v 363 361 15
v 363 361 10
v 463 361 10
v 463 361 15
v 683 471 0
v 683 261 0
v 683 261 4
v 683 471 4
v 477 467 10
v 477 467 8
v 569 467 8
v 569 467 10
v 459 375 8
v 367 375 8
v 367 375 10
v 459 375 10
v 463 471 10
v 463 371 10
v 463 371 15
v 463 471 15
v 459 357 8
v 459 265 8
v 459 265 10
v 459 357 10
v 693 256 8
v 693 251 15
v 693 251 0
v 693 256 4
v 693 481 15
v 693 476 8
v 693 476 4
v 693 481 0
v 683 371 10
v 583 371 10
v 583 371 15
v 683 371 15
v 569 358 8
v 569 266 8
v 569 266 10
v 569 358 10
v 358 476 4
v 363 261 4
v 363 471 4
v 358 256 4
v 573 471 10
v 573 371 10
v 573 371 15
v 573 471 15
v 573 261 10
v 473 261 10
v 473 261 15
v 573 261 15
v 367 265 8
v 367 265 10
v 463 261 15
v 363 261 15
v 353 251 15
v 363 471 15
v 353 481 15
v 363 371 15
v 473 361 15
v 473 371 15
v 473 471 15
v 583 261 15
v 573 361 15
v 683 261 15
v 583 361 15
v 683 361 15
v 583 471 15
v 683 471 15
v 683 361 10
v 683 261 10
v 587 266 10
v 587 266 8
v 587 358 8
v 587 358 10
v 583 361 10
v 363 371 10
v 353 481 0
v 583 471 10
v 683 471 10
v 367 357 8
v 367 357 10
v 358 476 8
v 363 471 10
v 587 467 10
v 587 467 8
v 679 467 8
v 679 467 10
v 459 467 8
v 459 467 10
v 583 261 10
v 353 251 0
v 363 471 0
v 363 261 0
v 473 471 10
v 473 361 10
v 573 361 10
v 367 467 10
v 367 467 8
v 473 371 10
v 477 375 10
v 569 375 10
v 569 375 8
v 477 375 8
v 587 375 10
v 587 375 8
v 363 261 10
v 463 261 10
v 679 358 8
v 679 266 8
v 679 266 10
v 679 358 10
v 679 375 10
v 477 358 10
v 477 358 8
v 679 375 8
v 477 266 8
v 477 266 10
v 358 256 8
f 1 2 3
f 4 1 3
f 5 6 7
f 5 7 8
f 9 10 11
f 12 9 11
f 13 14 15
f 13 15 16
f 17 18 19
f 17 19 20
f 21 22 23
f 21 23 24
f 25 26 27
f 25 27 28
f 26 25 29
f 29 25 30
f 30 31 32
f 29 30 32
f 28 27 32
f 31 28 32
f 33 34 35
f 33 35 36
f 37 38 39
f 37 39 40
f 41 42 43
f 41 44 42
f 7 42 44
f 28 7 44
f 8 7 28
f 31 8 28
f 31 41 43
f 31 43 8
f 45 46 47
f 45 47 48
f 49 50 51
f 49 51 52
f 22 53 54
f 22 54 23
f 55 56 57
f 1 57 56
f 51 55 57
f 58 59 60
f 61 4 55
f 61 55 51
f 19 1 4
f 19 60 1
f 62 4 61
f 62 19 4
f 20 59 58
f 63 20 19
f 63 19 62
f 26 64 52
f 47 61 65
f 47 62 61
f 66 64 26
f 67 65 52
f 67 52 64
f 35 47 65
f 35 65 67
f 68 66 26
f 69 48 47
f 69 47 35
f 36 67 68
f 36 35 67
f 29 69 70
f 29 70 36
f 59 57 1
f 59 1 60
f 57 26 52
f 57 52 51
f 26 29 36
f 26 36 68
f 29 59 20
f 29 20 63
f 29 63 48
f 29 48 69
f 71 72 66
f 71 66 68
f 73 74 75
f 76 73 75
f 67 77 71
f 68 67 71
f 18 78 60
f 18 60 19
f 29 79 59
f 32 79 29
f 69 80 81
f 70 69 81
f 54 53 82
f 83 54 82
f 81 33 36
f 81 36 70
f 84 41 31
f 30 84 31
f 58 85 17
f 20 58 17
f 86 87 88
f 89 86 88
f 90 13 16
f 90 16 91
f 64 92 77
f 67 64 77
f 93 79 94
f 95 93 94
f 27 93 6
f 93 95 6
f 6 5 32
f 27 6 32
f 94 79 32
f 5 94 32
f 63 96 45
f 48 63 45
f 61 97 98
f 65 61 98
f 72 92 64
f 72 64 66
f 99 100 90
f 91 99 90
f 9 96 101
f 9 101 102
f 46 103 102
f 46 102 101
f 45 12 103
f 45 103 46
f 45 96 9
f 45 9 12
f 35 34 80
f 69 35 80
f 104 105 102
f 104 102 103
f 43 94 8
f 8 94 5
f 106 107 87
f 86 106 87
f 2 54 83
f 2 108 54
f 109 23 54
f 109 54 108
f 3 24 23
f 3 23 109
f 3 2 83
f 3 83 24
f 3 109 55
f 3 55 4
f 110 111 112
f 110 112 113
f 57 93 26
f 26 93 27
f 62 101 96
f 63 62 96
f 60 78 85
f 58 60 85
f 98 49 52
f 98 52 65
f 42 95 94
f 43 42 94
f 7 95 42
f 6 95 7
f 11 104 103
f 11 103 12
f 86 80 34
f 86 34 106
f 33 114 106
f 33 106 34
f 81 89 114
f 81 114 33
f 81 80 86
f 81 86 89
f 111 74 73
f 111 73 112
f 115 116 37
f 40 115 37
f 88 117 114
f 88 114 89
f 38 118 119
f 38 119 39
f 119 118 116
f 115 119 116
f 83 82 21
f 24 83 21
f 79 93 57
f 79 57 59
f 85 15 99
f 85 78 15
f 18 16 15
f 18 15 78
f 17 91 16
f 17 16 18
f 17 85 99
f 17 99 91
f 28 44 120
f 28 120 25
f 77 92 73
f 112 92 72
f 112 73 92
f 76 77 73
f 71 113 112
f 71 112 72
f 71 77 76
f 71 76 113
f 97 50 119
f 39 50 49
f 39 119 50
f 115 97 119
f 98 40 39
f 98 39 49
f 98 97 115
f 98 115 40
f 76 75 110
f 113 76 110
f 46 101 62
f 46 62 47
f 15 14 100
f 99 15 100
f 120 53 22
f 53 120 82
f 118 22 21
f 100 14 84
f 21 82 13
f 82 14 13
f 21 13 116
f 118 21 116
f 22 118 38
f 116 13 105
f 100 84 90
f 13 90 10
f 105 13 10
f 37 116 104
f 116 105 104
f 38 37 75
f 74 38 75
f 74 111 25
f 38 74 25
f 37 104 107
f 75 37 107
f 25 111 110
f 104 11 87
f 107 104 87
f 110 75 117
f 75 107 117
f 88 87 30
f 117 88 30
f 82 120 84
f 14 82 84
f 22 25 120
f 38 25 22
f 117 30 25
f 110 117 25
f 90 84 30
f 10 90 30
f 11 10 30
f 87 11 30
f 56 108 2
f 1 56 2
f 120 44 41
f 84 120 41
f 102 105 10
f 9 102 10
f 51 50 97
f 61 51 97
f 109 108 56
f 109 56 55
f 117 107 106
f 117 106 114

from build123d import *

# Parameters (mm, degrees)
BOX038_W     = 92
BOX038_H     = 92
BOX038_DEPTH = 24
BOX034_W     = 92
BOX034_H     = 92
BOX034_DEPTH = 24
BOX036_W     = 92
BOX036_H     = 92
BOX036_DEPTH = 24
BOX037_W     = 92
BOX037_H     = 92
BOX037_DEPTH = 24
BOX035_W     = 92
BOX035_H     = 92
BOX035_DEPTH = 24
BOX032_W     = 92
BOX032_H     = 92
BOX032_DEPTH = 24
BOX030_W     = 320
BOX030_H     = 210
BOX030_DEPTH = 2
BOX039_W     = 335
BOX039_H     = 220
BOX039_DEPTH = 4
BOX031_W     = 10
BOX031_H     = 210
BOX031_DEPTH = 7
BOX028_W     = 340
BOX028_H     = 10
BOX028_DEPTH = 7
BOX027_W     = 10
BOX027_H     = 210
BOX027_DEPTH = 15
BOX033_W     = 10
BOX033_H     = 210
BOX033_DEPTH = 15
BOX026_W     = 340
BOX026_H     = 10
BOX026_DEPTH = 15
BOX025_W     = 340
BOX025_H     = 10
BOX025_DEPTH = 15
BOX029_W     = 10
BOX029_H     = 210
BOX029_DEPTH = 7


with BuildPart() as cajita022:
    # Box038 → Box038 (new body)
    with BuildSketch(Plane(origin=(14, 124, 0), x_dir=(1, 0, 0), z_dir=(0, 0, 1))):
        with Locations((46, 46)):
            Rectangle(BOX038_W, BOX038_H)
    extrude(amount=BOX038_DEPTH)


with BuildPart() as cajita018:
    # Box034 → Box034 (new body)
    with BuildSketch(Plane(origin=(124, 124, 0), x_dir=(1, 0, 0), z_dir=(0, 0, 1))):
        with Locations((46, 46)):
            Rectangle(BOX034_W, BOX034_H)
    extrude(amount=BOX034_DEPTH)


with BuildPart() as cajita020:
    # Box036 → Box036 (new body)
    with BuildSketch(Plane(origin=(234, 124, 0), x_dir=(1, 0, 0), z_dir=(0, 0, 1))):
        with Locations((46, 46)):
            Rectangle(BOX036_W, BOX036_H)
    extrude(amount=BOX036_DEPTH)


with BuildPart() as cajita021:
    # Box037 → Box037 (new body)
    with BuildSketch(Plane(origin=(234, 15, 0), x_dir=(1, 0, 0), z_dir=(0, 0, 1))):
        with Locations((46, 46)):
            Rectangle(BOX037_W, BOX037_H)
    extrude(amount=BOX037_DEPTH)


with BuildPart() as cajita019:
    # Box035 → Box035 (new body)
    with BuildSketch(Plane(origin=(124, 15, 0), x_dir=(1, 0, 0), z_dir=(0, 0, 1))):
        with Locations((46, 46)):
            Rectangle(BOX035_W, BOX035_H)
    extrude(amount=BOX035_DEPTH)


with BuildPart() as cajita017:
    # Box032 → Box032 (new body)
    with BuildSketch(Plane(origin=(14, 14, 0), x_dir=(1, 0, 0), z_dir=(0, 0, 1))):
        with Locations((46, 46)):
            Rectangle(BOX032_W, BOX032_H)
    extrude(amount=BOX032_DEPTH)


with BuildPart() as cajita016:
    # Box030 → Box030 (new body)
    with BuildSketch(Plane(origin=(10, 10, 8), x_dir=(1, 0, 0), z_dir=(0, 0, 1))):
        with Locations((160, 105)):
            Rectangle(BOX030_W, BOX030_H)
    extrude(amount=BOX030_DEPTH)


with BuildPart() as cajita023:
    # Box039 → Box039 (new body)
    with BuildSketch(Plane(origin=(5, 5, 4), x_dir=(1, 0, 0), z_dir=(0, 0, 1))):
        with Locations((167.5, 110)):
            Rectangle(BOX039_W, BOX039_H)
    extrude(amount=BOX039_DEPTH)


with BuildPart() as ancho006:
    # Box031 → Box031 (new body)
    with BuildSketch(Plane(origin=(220, 10, 8), x_dir=(1, 0, 0), z_dir=(0, 0, 1))):
        with Locations((5, 105)):
            Rectangle(BOX031_W, BOX031_H)
    extrude(amount=BOX031_DEPTH)


with BuildPart() as base007:
    # Box028 → Box028 (new body)
    with BuildSketch(Plane(origin=(0, 110, 8), x_dir=(1, 0, 0), z_dir=(0, 0, 1))):
        with Locations((170, 5)):
            Rectangle(BOX028_W, BOX028_H)
    extrude(amount=BOX028_DEPTH)


with BuildPart() as ancho004:
    # Box027 → Box027 (new body)
    with BuildSketch(Plane(origin=(330, 10, 0), x_dir=(1, 0, 0), z_dir=(0, 0, 1))):
        with Locations((5, 105)):
            Rectangle(BOX027_W, BOX027_H)
    extrude(amount=BOX027_DEPTH)


with BuildPart() as ancho007:
    # Box033 → Box033 (new body)
    with BuildSketch(Plane(origin=(0, 10, 0), x_dir=(1, 0, 0), z_dir=(0, 0, 1))):
        with Locations((5, 105)):
            Rectangle(BOX033_W, BOX033_H)
    extrude(amount=BOX033_DEPTH)


with BuildPart() as base006:
    # Box026 → Box026 (new body)
    with BuildSketch(Plane(origin=(0, 220, 0), x_dir=(1, 0, 0), z_dir=(0, 0, 1))):
        with Locations((170, 5)):
            Rectangle(BOX026_W, BOX026_H)
    extrude(amount=BOX026_DEPTH)


with BuildPart() as base005:
    # Box025 → Box025 (new body)
    with BuildSketch(Plane.XY):
        with Locations((170, 5)):
            Rectangle(BOX025_W, BOX025_H)
    extrude(amount=BOX025_DEPTH)


with BuildPart() as baseoriginal:
    # Box029 → Box029 (new body)
    with BuildSketch(Plane(origin=(110, 10, 8), x_dir=(1, 0, 0), z_dir=(0, 0, 1))):
        with Locations((5, 105)):
            Rectangle(BOX029_W, BOX029_H)
    extrude(amount=BOX029_DEPTH)

    # Fusion003: union ancho006, base007, ancho004, ancho007, base006, base005
    add(ancho006.part)
    add(base007.part)
    add(ancho004.part)
    add(ancho007.part)
    add(base006.part)
    add(base005.part)

    # Cut012: cut cajita023
    add(cajita023.part, mode=Mode.SUBTRACT)

    # Fusion002: union cajita016
    add(cajita016.part)

    # Cut008: cut cajita017
    add(cajita017.part, mode=Mode.SUBTRACT)

    # Cut009: cut cajita019
    add(cajita019.part, mode=Mode.SUBTRACT)

    # Cut014: cut cajita021
    add(cajita021.part, mode=Mode.SUBTRACT)

    # Cut010: cut cajita020
    add(cajita020.part, mode=Mode.SUBTRACT)

    # Cut011: cut cajita018
    add(cajita018.part, mode=Mode.SUBTRACT)

    # Cut013: cut cajita022
    add(cajita022.part, mode=Mode.SUBTRACT)


with BuildPart() as baseoriginal_1:
    # Cut013 placement: moved
    add(baseoriginal.part.moved(Location((353, 251, 0))))


solid = baseoriginal_1.part
